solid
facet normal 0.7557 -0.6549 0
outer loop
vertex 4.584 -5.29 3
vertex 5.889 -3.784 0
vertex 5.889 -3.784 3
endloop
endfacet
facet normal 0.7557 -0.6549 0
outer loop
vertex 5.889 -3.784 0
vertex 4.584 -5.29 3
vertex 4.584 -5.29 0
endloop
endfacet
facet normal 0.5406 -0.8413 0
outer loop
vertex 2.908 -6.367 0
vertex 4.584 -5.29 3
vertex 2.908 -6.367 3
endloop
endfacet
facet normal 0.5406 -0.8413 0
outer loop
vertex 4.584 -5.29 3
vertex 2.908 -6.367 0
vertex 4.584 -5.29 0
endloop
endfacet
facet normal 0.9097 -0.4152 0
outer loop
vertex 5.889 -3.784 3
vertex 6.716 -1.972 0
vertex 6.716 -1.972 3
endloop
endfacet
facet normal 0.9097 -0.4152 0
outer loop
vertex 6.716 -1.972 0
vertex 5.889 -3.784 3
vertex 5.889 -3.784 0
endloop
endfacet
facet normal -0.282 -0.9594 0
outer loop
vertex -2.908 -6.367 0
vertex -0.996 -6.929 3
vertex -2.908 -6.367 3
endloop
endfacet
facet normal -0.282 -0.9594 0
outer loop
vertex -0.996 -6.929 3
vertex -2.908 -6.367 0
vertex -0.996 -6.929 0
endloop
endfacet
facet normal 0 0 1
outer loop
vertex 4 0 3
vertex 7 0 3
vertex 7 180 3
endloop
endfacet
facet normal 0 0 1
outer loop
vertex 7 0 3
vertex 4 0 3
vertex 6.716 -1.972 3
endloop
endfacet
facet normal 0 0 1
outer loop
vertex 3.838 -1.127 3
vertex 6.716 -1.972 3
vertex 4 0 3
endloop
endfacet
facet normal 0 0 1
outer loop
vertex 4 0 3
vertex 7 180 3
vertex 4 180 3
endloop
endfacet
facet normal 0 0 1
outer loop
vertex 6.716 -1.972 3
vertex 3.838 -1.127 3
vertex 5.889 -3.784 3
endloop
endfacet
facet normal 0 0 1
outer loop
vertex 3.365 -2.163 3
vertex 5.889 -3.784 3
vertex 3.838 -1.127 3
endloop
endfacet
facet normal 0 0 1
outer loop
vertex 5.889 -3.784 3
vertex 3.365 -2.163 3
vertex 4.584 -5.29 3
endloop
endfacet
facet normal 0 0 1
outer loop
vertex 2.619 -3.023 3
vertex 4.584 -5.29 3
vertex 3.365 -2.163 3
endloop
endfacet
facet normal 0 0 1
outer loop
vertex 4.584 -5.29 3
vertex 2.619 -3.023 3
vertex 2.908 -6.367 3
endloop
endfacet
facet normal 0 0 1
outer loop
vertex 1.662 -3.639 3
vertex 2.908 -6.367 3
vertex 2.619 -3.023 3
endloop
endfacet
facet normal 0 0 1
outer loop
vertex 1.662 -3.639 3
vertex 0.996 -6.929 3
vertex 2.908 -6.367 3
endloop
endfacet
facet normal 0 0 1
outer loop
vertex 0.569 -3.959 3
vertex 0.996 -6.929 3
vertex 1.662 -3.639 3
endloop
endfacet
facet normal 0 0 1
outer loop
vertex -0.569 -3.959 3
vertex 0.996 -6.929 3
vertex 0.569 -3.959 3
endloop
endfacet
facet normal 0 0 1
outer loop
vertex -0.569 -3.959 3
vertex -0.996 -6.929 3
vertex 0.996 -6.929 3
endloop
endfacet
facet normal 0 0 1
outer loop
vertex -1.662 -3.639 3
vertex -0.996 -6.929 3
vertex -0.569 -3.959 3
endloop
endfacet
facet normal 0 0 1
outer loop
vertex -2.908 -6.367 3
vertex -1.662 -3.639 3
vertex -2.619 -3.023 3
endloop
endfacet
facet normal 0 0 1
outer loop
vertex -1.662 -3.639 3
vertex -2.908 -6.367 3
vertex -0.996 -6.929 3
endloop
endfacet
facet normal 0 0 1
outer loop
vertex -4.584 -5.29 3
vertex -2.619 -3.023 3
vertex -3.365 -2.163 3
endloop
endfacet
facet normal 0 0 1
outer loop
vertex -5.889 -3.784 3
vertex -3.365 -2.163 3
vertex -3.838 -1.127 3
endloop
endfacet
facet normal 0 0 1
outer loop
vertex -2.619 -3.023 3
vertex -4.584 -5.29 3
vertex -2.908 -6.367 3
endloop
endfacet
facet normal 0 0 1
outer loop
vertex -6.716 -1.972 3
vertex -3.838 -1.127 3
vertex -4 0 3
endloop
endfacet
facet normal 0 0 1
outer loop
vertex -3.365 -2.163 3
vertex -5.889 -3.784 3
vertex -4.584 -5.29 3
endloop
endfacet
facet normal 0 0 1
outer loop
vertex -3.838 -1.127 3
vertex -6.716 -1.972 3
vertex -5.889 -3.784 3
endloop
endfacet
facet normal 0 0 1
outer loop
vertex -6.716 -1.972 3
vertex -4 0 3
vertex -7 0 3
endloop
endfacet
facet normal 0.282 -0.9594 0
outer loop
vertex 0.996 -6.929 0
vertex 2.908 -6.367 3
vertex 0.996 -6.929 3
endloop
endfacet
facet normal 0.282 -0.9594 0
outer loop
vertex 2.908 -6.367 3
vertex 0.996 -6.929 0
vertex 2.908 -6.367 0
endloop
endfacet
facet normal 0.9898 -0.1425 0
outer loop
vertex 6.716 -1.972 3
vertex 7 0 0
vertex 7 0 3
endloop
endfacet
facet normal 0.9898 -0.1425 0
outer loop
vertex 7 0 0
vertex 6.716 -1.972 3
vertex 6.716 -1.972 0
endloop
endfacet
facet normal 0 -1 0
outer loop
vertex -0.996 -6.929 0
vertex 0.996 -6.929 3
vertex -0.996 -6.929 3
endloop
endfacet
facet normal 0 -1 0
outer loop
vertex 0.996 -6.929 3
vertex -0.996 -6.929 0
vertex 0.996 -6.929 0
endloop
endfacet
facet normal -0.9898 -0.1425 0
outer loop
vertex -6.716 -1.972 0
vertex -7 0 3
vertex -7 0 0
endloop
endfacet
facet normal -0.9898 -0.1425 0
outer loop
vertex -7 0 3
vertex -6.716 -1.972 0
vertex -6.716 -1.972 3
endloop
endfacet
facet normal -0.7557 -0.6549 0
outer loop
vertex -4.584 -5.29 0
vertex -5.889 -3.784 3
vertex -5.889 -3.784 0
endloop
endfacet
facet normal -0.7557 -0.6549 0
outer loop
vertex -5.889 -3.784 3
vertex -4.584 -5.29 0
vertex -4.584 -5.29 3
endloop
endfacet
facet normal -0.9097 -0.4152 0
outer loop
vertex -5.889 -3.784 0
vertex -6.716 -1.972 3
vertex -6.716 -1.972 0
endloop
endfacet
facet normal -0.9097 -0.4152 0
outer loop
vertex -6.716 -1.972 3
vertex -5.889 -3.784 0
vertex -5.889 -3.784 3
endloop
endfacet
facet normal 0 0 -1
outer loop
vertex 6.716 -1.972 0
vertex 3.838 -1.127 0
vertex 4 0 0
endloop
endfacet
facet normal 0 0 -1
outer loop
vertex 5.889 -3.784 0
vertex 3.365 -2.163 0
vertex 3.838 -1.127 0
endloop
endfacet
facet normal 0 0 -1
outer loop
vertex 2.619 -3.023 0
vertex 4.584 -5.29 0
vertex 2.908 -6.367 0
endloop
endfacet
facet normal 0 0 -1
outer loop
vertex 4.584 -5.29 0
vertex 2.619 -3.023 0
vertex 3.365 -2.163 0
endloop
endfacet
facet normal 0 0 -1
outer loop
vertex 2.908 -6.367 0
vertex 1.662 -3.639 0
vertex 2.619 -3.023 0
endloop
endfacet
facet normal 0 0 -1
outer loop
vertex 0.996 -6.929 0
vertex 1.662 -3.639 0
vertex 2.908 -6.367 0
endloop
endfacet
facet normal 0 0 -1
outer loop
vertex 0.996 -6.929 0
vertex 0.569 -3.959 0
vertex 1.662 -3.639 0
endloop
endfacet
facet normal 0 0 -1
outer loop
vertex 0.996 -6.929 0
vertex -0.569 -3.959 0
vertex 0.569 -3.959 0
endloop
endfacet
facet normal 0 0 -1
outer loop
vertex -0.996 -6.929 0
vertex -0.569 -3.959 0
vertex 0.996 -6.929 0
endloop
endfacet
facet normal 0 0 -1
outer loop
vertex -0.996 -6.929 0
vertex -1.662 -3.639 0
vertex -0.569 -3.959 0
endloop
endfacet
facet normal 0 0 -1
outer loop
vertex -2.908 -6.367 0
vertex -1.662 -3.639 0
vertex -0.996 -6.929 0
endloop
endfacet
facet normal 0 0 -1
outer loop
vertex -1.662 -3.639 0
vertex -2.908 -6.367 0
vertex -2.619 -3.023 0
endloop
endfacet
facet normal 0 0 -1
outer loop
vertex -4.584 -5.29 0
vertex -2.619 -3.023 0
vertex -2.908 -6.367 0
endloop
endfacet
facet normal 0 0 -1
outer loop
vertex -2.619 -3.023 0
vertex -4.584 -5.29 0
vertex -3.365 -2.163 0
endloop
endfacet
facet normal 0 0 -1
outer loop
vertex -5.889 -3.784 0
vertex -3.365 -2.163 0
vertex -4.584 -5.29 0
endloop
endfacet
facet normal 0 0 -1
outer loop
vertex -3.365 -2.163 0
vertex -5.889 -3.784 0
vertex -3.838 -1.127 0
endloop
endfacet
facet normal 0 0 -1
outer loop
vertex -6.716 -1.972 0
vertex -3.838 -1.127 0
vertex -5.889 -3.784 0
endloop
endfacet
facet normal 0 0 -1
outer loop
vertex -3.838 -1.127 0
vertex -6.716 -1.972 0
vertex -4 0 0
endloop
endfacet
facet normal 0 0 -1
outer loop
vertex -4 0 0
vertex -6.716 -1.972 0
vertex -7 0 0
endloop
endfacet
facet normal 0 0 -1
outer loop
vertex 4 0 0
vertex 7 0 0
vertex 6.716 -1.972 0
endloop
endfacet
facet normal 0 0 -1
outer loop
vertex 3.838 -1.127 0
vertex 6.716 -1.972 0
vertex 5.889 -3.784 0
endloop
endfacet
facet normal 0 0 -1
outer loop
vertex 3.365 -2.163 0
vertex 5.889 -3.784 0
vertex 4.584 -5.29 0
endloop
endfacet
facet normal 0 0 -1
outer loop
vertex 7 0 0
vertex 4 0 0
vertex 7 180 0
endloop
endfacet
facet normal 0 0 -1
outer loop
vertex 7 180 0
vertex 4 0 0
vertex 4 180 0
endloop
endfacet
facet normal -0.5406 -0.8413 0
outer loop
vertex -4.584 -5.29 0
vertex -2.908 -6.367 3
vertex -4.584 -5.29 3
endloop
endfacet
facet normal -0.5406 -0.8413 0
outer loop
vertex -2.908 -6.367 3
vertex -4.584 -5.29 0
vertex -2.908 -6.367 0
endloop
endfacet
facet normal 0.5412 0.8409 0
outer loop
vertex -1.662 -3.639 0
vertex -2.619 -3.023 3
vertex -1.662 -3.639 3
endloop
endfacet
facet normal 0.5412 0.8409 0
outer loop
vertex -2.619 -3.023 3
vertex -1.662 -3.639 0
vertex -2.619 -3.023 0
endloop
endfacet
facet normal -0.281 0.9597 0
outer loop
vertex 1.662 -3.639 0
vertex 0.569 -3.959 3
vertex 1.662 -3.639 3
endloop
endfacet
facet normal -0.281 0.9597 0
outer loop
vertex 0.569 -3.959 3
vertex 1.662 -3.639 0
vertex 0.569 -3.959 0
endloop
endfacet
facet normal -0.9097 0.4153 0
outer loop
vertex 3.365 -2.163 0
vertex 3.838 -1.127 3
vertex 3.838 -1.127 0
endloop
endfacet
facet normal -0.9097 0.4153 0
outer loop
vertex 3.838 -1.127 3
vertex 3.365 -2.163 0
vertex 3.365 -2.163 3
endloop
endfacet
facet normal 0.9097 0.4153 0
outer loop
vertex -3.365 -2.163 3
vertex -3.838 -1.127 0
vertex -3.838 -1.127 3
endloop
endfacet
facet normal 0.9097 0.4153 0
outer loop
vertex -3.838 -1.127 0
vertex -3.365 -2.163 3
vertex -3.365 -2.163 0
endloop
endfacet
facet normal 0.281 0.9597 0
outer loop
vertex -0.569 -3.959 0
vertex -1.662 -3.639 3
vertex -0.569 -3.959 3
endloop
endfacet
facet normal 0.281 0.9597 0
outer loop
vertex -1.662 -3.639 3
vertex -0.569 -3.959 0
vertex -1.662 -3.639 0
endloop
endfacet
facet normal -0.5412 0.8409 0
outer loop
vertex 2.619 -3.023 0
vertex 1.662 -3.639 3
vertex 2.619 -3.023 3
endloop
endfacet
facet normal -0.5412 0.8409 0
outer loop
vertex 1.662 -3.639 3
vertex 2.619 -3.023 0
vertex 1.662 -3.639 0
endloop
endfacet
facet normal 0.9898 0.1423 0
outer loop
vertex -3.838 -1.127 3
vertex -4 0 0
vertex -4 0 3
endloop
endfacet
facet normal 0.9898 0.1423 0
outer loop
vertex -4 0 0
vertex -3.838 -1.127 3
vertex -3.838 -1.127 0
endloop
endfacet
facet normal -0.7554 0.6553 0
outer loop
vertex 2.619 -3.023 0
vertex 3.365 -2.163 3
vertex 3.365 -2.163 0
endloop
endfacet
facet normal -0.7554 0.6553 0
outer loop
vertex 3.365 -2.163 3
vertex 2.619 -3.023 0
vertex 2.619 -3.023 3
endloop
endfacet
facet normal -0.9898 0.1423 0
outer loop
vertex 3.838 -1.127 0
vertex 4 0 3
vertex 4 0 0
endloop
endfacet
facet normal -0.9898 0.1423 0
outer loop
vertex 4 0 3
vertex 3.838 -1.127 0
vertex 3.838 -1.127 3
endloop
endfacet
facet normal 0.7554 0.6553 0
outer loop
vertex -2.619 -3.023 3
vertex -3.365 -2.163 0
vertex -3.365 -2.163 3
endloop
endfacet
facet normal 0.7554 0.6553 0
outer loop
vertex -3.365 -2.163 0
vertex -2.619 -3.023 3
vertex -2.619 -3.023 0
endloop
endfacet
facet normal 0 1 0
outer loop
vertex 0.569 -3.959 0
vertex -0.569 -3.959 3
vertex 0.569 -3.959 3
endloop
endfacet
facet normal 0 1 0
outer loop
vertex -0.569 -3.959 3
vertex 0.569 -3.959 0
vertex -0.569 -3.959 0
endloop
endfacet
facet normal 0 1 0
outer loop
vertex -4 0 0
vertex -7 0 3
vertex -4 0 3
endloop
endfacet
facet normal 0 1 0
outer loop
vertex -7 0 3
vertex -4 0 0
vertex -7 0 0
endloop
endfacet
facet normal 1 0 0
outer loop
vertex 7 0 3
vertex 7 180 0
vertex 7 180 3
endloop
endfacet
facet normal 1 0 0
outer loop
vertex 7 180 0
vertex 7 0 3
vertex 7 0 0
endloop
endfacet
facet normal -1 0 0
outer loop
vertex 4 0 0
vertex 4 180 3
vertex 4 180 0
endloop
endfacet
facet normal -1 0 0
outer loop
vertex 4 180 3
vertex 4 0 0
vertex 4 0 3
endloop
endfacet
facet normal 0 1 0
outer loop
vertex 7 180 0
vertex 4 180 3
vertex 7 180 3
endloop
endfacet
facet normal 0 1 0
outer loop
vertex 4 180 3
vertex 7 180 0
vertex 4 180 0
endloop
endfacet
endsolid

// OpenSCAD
use <MCAD/regular_shapes.scad>

t = 3;
r = 7;
l = 180;

intersection(){
    cylinder_tube(t, 7, t);
    cube_r = 3*r;
    translate([0, -cube_r/2, 0])
    cube([cube_r, cube_r, cube_r], center=true);
}

translate([r - t, 0, 0])
cube([t, l, t]);
